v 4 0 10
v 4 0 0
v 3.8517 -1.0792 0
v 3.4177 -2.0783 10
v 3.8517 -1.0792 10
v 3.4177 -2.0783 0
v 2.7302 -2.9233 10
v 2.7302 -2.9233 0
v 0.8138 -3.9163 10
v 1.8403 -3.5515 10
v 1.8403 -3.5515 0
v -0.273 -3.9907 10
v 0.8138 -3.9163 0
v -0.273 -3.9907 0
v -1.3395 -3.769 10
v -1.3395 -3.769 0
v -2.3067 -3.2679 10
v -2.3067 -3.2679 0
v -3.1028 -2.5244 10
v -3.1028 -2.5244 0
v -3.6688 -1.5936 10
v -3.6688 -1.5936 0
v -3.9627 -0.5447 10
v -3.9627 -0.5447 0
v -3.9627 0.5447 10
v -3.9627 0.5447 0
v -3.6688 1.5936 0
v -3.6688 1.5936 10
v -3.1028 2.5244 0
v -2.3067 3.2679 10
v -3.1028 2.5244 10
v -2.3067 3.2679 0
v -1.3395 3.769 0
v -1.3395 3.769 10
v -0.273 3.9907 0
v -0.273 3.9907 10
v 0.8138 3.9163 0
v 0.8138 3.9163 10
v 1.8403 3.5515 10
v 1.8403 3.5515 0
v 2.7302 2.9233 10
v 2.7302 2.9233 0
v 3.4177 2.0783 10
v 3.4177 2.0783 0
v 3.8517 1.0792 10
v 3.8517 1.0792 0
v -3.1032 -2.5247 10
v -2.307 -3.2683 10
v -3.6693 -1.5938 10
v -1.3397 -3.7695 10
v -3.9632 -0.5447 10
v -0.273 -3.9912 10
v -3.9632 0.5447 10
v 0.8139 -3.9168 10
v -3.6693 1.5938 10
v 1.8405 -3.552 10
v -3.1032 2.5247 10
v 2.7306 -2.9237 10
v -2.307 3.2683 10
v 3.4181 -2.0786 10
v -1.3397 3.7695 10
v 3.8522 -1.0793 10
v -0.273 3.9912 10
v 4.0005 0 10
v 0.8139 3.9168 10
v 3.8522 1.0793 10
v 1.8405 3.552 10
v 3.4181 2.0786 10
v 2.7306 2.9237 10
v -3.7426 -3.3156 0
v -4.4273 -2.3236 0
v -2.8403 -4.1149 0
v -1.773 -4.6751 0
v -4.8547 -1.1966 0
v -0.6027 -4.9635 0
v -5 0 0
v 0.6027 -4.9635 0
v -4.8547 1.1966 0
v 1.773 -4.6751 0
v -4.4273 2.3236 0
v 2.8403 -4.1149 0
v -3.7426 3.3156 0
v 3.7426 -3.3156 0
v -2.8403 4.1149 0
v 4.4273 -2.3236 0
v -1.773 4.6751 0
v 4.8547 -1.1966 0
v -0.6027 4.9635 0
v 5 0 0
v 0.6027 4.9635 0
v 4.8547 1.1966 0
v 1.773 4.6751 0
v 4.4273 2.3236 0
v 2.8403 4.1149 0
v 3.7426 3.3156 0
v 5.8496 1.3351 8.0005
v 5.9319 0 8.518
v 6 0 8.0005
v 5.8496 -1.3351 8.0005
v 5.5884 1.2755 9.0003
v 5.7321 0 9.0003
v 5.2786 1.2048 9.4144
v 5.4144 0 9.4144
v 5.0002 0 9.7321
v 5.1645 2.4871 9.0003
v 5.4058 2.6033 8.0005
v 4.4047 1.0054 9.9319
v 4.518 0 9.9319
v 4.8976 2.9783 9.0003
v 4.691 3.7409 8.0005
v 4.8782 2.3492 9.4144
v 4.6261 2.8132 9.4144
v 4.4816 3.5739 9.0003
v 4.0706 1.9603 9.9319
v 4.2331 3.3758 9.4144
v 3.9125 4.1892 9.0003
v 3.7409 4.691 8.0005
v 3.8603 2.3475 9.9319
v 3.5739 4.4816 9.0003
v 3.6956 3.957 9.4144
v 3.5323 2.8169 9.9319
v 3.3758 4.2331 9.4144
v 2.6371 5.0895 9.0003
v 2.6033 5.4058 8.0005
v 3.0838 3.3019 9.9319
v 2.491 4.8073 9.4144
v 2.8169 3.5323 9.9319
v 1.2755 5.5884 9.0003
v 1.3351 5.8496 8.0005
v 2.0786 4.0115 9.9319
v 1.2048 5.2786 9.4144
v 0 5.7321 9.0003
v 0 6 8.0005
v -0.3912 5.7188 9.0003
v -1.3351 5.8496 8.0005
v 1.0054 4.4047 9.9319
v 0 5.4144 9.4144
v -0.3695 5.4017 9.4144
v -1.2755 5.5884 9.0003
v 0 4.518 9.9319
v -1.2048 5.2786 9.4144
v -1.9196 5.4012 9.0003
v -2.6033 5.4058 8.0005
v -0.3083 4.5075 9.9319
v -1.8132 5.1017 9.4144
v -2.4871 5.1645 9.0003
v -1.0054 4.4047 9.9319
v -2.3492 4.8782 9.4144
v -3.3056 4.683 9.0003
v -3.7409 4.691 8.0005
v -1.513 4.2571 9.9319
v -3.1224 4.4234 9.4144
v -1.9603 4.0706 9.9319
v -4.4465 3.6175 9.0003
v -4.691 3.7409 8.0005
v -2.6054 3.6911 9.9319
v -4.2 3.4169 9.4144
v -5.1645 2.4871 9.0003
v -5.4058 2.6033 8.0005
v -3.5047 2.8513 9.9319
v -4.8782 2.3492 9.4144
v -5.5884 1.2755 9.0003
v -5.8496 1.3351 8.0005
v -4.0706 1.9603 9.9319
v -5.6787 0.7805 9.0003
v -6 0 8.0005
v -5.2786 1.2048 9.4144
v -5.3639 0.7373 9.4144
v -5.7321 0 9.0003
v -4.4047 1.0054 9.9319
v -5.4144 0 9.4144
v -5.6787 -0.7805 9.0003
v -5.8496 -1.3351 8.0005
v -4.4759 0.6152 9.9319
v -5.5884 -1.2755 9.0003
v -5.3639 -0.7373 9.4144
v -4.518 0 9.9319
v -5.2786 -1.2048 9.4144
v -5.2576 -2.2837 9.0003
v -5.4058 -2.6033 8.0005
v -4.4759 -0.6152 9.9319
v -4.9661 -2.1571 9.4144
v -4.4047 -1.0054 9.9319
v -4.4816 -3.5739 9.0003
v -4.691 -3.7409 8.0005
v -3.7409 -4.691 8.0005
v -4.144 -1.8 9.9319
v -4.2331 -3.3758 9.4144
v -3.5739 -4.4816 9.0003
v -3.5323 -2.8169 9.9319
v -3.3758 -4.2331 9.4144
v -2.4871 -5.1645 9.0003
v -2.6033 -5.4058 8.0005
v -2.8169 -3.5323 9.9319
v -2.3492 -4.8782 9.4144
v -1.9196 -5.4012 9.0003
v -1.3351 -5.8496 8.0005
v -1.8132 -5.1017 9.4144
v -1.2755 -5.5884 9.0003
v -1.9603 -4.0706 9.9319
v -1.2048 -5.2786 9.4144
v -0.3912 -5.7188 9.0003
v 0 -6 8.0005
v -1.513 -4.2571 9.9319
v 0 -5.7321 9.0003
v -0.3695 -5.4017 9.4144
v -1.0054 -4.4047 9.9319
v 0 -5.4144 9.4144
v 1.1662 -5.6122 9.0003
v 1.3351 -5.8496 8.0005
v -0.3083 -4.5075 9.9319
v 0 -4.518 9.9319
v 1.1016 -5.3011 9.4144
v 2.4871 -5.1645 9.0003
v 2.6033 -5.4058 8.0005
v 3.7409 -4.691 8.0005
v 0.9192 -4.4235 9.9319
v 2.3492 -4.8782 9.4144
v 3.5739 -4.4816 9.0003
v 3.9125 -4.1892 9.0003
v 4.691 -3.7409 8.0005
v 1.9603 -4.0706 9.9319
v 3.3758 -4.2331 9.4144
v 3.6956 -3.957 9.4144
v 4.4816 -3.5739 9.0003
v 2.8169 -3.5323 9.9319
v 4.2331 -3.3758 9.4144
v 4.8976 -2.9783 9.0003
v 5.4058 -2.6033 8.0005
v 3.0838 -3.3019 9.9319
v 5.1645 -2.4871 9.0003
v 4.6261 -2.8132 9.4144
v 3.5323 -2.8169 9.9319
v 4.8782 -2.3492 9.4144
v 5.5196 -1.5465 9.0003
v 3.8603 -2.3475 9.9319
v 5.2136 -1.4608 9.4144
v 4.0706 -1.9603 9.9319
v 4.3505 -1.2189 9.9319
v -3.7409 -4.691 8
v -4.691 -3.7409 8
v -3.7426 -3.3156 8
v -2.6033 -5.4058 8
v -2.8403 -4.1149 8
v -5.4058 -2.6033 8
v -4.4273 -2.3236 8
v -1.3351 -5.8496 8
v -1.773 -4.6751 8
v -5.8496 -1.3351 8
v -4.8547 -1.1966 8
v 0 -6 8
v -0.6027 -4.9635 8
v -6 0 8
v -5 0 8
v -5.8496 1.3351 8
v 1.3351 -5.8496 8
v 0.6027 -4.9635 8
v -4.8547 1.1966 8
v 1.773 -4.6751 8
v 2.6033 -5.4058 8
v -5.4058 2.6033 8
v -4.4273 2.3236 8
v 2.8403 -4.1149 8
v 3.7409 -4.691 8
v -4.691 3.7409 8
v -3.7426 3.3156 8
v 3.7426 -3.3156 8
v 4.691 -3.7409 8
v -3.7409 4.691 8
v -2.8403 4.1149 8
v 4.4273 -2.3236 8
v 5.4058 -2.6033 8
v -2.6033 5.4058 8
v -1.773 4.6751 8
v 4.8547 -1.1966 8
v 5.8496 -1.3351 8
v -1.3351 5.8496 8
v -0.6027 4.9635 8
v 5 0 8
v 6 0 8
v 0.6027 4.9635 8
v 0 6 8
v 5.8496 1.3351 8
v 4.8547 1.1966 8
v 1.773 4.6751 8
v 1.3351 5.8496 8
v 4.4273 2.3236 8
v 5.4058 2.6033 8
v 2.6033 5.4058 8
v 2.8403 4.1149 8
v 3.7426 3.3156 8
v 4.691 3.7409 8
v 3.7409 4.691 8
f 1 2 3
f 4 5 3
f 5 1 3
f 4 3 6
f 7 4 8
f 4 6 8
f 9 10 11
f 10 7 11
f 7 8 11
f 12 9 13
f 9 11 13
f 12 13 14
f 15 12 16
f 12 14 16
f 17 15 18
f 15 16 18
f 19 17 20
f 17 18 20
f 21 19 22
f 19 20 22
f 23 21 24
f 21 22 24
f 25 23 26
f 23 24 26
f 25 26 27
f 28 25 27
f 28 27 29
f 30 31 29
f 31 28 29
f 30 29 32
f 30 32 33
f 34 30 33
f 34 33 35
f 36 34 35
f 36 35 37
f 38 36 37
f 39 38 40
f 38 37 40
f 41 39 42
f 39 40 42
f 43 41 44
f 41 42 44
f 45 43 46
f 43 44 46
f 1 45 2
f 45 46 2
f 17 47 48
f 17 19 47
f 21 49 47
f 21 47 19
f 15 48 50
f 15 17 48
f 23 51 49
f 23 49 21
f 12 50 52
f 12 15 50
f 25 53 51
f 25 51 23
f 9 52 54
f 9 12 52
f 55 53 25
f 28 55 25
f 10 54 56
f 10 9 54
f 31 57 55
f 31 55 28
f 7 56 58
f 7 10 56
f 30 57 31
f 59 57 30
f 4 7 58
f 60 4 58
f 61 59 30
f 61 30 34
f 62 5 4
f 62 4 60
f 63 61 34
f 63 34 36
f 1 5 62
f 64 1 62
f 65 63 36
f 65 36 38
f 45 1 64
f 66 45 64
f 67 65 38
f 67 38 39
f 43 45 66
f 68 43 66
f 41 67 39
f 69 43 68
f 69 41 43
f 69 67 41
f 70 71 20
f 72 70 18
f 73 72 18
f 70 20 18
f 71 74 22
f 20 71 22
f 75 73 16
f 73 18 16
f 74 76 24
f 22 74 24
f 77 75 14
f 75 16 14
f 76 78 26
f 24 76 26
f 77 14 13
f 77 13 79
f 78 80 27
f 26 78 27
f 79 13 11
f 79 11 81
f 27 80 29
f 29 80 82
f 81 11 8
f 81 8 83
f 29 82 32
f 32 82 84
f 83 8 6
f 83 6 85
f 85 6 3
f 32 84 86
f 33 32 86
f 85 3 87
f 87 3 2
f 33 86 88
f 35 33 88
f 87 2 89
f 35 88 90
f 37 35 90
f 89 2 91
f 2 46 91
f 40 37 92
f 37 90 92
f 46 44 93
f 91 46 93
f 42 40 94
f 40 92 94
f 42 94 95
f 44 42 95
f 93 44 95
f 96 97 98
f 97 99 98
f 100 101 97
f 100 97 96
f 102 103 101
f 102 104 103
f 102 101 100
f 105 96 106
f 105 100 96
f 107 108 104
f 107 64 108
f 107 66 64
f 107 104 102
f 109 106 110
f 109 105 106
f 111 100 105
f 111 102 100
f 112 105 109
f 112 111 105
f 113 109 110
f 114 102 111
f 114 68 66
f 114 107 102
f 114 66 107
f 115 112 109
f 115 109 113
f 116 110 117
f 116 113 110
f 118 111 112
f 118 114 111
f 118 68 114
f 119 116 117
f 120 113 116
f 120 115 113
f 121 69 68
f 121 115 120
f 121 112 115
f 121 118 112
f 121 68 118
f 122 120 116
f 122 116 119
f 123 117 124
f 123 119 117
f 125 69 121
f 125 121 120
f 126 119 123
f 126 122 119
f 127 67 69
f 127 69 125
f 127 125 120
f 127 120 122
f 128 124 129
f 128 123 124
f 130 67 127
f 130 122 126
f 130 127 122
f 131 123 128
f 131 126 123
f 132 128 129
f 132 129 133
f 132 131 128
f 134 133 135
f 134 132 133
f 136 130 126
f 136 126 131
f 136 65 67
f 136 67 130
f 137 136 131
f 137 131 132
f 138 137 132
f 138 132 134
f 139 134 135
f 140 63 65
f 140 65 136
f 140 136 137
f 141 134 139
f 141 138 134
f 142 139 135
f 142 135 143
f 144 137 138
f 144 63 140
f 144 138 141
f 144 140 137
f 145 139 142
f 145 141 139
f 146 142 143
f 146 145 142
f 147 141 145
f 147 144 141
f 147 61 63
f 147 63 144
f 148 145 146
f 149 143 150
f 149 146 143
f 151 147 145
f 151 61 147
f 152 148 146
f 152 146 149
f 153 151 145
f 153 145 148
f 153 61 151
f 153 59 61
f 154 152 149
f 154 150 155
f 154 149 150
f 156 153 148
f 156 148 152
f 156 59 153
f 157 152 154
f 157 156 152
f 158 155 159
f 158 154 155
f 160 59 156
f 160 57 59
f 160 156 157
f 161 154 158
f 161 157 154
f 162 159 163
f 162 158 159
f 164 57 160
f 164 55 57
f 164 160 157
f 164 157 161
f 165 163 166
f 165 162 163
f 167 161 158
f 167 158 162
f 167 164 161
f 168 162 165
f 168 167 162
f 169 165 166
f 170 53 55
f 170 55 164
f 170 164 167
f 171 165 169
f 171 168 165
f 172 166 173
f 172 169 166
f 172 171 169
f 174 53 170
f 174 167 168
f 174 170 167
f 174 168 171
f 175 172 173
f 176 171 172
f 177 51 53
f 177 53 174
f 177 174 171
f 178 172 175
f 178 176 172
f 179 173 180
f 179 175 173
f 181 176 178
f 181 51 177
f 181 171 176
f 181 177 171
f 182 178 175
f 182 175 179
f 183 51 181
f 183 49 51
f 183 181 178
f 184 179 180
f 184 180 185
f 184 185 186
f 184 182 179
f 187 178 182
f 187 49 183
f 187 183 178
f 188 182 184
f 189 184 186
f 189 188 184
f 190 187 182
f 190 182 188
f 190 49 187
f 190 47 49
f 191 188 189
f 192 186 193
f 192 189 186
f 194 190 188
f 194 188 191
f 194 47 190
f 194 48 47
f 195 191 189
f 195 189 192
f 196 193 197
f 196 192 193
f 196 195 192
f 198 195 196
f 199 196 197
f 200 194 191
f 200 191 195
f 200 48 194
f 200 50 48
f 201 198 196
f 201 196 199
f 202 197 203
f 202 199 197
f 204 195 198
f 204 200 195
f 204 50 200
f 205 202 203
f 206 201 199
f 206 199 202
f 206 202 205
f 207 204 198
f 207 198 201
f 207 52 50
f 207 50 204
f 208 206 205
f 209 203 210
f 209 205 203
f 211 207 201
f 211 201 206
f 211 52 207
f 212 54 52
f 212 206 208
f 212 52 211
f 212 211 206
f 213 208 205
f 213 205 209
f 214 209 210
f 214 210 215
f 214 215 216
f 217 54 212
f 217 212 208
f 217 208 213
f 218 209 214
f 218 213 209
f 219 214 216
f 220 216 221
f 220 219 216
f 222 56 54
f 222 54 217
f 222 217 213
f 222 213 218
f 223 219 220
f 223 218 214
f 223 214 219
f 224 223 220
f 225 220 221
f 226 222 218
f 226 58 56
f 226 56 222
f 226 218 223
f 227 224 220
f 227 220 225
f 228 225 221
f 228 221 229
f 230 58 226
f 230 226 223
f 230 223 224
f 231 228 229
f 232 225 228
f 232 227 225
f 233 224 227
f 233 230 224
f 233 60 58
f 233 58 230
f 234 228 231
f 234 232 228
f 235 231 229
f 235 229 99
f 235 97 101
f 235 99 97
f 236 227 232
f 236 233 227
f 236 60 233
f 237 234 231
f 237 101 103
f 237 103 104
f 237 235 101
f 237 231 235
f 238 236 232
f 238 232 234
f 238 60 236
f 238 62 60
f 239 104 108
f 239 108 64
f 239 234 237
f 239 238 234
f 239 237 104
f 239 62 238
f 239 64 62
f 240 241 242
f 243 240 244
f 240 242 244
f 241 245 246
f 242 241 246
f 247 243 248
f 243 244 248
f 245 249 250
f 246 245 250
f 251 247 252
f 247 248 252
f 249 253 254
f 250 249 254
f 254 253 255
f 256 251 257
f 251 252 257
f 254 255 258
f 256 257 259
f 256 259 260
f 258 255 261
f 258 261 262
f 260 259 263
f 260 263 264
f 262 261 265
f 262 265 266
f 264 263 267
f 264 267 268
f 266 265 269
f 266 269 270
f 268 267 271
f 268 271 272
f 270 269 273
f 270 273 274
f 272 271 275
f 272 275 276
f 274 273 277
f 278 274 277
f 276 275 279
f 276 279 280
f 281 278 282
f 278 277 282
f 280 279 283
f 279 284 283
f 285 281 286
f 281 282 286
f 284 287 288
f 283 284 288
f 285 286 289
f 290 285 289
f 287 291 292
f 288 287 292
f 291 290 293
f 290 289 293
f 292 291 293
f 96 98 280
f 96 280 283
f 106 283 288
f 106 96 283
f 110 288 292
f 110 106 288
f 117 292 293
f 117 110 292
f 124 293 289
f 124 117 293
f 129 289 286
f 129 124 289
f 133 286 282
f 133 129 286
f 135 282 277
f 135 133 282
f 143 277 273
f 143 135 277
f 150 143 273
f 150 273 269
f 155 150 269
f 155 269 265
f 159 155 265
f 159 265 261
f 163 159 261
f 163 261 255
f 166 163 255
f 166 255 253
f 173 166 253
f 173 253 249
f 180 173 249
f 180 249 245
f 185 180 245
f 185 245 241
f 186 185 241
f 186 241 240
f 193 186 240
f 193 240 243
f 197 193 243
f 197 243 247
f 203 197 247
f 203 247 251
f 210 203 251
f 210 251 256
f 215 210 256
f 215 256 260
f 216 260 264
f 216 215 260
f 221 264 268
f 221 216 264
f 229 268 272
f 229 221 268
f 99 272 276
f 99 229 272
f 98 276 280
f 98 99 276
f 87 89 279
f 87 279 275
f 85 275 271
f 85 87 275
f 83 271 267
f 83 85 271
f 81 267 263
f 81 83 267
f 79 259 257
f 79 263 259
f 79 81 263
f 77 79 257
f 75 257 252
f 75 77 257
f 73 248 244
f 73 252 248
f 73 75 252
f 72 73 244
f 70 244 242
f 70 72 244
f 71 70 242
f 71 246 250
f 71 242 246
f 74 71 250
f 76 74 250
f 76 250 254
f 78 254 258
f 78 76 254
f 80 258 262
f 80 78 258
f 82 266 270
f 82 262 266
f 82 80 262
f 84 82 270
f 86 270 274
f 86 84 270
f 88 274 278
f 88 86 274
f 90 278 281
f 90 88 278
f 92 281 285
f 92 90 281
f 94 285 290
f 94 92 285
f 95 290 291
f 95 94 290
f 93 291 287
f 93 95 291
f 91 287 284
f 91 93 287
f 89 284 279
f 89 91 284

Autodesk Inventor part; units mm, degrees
ref_plane "YZ Plane" through (0, 0, 0) normal (1, 0, 0) x (0, 1, 0)
ref_plane "XZ Plane" through (0, 0, 0) normal (0, 1, 0) x (-1, 0, 0)
ref_plane "XY Plane" through (0, 0, 0) normal (0, 0, 1) x (1, 0, 0)
sketch "Эскиз1" plane through (0, 0, 0) normal (0, 0, 1) x (1, 0, 0)
  circle A0 centre (0, 0) radius 4
  circle A1 centre (0, 0) radius 5
  dimension "d0" = 8
  dimension "d1" = 10
extrude "Выдавливание1" add sketch "Эскиз1" along normal blind 10
sketch "Эскиз2" plane through (0, 0, 10) normal (0, 0, 1) x (1, 0, 0)
  circle A0 centre (0, 0) radius 6
  circle A1 centre (0, 0) radius 5 projected
  dimension "d4" = 12
extrude "Выдавливание2" add sketch "Эскиз2" against normal blind 2
fillet "Сопряжение1" radius 2 1 edges at (-6, 0, 10)
properties part number "hole_big" material "Латунь"
